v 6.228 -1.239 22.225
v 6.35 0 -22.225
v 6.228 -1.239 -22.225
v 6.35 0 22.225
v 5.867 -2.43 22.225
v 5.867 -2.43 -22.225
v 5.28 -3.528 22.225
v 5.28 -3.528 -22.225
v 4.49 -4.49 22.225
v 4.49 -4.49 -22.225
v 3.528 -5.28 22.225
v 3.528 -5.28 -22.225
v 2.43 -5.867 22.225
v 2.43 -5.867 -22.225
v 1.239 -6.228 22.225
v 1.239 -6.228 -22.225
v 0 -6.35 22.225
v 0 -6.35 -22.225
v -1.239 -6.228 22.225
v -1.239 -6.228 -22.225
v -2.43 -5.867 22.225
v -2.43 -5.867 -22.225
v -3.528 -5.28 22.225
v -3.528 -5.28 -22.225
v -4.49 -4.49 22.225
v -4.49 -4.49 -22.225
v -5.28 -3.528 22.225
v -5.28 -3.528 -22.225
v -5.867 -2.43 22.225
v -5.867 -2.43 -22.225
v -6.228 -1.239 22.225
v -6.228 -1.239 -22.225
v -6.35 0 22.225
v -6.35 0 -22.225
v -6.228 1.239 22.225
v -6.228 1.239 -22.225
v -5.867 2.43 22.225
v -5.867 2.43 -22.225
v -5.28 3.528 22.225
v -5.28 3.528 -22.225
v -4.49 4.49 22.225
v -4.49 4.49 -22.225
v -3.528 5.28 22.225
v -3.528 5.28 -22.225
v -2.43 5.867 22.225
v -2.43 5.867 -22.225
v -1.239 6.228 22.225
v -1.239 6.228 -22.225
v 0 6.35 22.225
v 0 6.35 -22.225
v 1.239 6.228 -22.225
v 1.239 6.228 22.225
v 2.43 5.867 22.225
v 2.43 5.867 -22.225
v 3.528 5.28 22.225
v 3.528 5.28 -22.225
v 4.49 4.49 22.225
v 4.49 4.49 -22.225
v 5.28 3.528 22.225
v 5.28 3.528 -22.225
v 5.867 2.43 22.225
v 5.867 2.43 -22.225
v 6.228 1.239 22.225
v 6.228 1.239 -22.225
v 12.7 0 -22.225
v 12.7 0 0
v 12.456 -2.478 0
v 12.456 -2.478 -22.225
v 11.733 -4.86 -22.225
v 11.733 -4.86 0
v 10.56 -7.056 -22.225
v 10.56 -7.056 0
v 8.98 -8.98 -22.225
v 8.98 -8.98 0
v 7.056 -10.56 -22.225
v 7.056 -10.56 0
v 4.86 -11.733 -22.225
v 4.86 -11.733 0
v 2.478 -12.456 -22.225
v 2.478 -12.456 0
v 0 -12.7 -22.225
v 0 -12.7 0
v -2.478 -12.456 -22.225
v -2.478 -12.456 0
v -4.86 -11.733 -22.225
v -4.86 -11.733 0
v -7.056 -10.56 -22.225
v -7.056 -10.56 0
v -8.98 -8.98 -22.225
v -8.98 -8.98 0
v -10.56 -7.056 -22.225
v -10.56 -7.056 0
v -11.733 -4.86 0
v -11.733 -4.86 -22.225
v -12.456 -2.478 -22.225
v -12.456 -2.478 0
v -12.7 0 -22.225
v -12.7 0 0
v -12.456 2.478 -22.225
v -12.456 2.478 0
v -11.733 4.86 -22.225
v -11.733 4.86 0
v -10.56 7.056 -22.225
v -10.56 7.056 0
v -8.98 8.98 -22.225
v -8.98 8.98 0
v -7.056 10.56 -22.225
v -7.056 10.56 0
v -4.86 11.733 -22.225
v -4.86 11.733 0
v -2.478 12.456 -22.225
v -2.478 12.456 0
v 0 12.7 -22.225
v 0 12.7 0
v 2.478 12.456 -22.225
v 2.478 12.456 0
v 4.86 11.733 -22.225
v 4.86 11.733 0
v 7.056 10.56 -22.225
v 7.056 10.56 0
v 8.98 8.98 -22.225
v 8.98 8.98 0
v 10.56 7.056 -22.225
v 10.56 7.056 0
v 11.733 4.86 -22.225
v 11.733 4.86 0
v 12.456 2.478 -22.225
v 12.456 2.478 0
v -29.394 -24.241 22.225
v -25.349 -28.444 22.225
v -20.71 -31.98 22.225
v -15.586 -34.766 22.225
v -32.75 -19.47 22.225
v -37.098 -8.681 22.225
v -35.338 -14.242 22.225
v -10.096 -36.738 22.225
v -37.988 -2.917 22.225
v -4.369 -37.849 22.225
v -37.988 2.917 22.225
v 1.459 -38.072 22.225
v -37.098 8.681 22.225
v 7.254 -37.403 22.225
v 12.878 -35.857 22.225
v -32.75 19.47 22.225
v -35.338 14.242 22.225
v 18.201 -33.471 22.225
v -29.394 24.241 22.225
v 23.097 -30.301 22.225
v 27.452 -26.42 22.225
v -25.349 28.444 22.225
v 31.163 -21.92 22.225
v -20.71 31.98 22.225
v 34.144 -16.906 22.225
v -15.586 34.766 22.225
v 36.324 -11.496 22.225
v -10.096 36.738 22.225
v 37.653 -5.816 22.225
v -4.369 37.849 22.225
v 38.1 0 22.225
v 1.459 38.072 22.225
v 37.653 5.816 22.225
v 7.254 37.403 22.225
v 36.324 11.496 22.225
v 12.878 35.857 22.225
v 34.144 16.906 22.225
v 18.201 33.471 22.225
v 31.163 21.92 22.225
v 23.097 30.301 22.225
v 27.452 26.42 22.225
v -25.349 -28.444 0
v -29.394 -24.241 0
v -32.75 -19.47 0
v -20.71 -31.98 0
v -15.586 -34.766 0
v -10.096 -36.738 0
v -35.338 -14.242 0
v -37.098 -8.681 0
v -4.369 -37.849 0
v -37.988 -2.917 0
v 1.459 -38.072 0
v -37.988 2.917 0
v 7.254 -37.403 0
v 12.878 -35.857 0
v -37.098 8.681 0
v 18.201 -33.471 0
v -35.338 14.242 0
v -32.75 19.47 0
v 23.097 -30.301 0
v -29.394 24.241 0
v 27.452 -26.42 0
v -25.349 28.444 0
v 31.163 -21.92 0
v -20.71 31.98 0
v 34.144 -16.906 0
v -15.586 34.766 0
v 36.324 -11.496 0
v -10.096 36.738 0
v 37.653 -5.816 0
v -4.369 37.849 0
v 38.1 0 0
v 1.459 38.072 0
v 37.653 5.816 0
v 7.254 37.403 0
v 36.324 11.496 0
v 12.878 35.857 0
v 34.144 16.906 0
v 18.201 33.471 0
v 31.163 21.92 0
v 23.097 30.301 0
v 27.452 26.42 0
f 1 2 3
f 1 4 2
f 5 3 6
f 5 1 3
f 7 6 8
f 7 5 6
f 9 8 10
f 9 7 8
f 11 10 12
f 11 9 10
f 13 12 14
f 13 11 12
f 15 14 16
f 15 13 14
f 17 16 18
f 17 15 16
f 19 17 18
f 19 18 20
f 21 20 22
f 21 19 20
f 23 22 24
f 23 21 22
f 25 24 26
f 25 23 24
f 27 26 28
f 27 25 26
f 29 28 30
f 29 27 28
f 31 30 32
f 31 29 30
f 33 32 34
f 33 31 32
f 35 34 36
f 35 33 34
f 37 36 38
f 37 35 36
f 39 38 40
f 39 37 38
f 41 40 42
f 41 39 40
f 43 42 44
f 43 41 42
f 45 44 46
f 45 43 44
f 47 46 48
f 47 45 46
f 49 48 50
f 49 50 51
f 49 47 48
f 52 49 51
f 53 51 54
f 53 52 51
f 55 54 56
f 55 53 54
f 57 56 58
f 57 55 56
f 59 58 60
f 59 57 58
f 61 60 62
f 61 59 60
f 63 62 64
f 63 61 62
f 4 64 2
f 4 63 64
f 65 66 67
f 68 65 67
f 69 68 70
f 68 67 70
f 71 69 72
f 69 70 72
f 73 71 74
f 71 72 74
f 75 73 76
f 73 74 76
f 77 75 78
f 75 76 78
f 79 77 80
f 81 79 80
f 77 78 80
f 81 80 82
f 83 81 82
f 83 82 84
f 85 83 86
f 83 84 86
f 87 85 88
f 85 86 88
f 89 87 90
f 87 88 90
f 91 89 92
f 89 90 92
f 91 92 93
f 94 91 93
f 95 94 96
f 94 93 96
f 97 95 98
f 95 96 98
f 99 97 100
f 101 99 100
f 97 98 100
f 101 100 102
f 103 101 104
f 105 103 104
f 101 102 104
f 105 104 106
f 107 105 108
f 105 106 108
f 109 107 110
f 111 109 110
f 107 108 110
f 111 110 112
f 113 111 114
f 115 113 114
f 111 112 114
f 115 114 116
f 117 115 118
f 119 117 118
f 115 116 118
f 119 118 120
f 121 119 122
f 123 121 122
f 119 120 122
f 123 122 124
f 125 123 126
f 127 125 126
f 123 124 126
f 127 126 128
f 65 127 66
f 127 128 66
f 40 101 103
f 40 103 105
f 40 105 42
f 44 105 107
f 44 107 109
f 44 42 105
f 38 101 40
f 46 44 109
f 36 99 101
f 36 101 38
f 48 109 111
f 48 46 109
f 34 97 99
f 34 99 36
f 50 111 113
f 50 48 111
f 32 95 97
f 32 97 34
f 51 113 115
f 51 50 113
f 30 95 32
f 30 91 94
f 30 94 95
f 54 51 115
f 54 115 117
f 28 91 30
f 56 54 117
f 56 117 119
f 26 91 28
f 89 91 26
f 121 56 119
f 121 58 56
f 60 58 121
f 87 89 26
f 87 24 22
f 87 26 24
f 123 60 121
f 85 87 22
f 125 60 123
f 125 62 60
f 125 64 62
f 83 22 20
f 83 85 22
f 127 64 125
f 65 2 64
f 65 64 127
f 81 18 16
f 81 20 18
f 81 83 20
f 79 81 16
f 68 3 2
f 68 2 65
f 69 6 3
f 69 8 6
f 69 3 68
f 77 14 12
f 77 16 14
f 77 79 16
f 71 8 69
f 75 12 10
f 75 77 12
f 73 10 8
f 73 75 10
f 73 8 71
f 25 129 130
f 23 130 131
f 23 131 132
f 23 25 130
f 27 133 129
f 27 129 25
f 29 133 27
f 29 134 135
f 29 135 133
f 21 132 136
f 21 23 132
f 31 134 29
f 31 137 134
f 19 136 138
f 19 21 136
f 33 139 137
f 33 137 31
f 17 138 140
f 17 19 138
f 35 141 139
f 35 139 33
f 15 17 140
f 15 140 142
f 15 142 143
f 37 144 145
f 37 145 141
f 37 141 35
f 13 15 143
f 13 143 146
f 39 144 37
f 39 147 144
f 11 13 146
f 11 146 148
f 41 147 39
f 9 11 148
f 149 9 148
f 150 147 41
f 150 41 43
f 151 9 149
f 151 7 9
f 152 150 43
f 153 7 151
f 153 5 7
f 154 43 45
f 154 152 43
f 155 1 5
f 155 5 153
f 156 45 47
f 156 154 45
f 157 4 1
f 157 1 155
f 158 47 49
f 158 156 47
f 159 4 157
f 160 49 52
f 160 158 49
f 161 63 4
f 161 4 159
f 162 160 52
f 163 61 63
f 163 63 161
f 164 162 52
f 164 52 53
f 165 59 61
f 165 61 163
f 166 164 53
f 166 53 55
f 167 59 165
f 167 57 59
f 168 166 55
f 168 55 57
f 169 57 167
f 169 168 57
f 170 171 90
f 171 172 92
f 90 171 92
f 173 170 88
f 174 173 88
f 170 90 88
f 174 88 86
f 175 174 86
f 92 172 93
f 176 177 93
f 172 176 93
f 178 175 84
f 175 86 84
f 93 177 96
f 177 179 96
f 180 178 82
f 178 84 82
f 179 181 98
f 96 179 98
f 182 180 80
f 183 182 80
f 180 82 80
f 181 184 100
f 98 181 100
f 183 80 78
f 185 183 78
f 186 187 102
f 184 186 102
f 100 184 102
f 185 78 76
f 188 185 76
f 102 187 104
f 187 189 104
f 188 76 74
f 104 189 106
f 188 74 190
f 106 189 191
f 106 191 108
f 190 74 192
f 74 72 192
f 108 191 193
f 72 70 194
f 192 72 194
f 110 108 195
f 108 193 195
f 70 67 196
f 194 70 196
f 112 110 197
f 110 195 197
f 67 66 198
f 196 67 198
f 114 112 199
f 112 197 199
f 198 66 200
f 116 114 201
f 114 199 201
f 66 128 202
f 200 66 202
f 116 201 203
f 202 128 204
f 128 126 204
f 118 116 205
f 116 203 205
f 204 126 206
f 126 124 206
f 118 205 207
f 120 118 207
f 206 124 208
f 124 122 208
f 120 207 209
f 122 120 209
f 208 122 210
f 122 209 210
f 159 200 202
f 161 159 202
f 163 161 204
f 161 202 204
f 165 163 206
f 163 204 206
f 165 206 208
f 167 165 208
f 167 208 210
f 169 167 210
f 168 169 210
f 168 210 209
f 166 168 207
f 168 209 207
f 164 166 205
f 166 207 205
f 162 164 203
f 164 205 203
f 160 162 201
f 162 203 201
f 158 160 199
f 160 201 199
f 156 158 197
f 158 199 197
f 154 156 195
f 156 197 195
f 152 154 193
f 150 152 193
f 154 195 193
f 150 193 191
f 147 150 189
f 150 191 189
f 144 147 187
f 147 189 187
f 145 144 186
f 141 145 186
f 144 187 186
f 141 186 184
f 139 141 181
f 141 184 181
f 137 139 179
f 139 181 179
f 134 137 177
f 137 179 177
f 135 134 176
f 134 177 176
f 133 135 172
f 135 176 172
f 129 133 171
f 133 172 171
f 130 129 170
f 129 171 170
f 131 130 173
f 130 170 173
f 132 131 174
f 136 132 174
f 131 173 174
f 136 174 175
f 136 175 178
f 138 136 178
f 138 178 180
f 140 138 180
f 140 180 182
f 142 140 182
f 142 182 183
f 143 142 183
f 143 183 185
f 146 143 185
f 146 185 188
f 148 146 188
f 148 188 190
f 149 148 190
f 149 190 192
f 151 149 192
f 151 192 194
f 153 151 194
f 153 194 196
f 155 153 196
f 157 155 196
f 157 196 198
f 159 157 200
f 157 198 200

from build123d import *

# Parameters (mm, degrees)
F0_R     = 38.1
F1_DEPTH = 22.225
F2_R     = 6.35
F3_DEPTH = 35.49923
F4_R     = 12.7
F4_R_2   = 6.35
F5_DEPTH = 22.225


with BuildPart() as f1:
    # F0 (on Top) → F1 (new body)
    with BuildSketch(Plane.XY):
        Circle(F0_R)
    extrude(amount=F1_DEPTH)

    # F2 (on face) → F3 (cut)
    with BuildSketch(Plane.XY.offset(22.225)):
        Circle(F2_R)
    extrude(amount=-F3_DEPTH, mode=Mode.SUBTRACT)

    # F4 (on face) → F5 (join)
    with BuildSketch(Plane(origin=(0, 0, 0), x_dir=(1, 0, 0), z_dir=(0, 0, -1))):
        Circle(F4_R)
        Circle(F4_R_2, mode=Mode.SUBTRACT)
    extrude(amount=F5_DEPTH)


solid = f1.part
